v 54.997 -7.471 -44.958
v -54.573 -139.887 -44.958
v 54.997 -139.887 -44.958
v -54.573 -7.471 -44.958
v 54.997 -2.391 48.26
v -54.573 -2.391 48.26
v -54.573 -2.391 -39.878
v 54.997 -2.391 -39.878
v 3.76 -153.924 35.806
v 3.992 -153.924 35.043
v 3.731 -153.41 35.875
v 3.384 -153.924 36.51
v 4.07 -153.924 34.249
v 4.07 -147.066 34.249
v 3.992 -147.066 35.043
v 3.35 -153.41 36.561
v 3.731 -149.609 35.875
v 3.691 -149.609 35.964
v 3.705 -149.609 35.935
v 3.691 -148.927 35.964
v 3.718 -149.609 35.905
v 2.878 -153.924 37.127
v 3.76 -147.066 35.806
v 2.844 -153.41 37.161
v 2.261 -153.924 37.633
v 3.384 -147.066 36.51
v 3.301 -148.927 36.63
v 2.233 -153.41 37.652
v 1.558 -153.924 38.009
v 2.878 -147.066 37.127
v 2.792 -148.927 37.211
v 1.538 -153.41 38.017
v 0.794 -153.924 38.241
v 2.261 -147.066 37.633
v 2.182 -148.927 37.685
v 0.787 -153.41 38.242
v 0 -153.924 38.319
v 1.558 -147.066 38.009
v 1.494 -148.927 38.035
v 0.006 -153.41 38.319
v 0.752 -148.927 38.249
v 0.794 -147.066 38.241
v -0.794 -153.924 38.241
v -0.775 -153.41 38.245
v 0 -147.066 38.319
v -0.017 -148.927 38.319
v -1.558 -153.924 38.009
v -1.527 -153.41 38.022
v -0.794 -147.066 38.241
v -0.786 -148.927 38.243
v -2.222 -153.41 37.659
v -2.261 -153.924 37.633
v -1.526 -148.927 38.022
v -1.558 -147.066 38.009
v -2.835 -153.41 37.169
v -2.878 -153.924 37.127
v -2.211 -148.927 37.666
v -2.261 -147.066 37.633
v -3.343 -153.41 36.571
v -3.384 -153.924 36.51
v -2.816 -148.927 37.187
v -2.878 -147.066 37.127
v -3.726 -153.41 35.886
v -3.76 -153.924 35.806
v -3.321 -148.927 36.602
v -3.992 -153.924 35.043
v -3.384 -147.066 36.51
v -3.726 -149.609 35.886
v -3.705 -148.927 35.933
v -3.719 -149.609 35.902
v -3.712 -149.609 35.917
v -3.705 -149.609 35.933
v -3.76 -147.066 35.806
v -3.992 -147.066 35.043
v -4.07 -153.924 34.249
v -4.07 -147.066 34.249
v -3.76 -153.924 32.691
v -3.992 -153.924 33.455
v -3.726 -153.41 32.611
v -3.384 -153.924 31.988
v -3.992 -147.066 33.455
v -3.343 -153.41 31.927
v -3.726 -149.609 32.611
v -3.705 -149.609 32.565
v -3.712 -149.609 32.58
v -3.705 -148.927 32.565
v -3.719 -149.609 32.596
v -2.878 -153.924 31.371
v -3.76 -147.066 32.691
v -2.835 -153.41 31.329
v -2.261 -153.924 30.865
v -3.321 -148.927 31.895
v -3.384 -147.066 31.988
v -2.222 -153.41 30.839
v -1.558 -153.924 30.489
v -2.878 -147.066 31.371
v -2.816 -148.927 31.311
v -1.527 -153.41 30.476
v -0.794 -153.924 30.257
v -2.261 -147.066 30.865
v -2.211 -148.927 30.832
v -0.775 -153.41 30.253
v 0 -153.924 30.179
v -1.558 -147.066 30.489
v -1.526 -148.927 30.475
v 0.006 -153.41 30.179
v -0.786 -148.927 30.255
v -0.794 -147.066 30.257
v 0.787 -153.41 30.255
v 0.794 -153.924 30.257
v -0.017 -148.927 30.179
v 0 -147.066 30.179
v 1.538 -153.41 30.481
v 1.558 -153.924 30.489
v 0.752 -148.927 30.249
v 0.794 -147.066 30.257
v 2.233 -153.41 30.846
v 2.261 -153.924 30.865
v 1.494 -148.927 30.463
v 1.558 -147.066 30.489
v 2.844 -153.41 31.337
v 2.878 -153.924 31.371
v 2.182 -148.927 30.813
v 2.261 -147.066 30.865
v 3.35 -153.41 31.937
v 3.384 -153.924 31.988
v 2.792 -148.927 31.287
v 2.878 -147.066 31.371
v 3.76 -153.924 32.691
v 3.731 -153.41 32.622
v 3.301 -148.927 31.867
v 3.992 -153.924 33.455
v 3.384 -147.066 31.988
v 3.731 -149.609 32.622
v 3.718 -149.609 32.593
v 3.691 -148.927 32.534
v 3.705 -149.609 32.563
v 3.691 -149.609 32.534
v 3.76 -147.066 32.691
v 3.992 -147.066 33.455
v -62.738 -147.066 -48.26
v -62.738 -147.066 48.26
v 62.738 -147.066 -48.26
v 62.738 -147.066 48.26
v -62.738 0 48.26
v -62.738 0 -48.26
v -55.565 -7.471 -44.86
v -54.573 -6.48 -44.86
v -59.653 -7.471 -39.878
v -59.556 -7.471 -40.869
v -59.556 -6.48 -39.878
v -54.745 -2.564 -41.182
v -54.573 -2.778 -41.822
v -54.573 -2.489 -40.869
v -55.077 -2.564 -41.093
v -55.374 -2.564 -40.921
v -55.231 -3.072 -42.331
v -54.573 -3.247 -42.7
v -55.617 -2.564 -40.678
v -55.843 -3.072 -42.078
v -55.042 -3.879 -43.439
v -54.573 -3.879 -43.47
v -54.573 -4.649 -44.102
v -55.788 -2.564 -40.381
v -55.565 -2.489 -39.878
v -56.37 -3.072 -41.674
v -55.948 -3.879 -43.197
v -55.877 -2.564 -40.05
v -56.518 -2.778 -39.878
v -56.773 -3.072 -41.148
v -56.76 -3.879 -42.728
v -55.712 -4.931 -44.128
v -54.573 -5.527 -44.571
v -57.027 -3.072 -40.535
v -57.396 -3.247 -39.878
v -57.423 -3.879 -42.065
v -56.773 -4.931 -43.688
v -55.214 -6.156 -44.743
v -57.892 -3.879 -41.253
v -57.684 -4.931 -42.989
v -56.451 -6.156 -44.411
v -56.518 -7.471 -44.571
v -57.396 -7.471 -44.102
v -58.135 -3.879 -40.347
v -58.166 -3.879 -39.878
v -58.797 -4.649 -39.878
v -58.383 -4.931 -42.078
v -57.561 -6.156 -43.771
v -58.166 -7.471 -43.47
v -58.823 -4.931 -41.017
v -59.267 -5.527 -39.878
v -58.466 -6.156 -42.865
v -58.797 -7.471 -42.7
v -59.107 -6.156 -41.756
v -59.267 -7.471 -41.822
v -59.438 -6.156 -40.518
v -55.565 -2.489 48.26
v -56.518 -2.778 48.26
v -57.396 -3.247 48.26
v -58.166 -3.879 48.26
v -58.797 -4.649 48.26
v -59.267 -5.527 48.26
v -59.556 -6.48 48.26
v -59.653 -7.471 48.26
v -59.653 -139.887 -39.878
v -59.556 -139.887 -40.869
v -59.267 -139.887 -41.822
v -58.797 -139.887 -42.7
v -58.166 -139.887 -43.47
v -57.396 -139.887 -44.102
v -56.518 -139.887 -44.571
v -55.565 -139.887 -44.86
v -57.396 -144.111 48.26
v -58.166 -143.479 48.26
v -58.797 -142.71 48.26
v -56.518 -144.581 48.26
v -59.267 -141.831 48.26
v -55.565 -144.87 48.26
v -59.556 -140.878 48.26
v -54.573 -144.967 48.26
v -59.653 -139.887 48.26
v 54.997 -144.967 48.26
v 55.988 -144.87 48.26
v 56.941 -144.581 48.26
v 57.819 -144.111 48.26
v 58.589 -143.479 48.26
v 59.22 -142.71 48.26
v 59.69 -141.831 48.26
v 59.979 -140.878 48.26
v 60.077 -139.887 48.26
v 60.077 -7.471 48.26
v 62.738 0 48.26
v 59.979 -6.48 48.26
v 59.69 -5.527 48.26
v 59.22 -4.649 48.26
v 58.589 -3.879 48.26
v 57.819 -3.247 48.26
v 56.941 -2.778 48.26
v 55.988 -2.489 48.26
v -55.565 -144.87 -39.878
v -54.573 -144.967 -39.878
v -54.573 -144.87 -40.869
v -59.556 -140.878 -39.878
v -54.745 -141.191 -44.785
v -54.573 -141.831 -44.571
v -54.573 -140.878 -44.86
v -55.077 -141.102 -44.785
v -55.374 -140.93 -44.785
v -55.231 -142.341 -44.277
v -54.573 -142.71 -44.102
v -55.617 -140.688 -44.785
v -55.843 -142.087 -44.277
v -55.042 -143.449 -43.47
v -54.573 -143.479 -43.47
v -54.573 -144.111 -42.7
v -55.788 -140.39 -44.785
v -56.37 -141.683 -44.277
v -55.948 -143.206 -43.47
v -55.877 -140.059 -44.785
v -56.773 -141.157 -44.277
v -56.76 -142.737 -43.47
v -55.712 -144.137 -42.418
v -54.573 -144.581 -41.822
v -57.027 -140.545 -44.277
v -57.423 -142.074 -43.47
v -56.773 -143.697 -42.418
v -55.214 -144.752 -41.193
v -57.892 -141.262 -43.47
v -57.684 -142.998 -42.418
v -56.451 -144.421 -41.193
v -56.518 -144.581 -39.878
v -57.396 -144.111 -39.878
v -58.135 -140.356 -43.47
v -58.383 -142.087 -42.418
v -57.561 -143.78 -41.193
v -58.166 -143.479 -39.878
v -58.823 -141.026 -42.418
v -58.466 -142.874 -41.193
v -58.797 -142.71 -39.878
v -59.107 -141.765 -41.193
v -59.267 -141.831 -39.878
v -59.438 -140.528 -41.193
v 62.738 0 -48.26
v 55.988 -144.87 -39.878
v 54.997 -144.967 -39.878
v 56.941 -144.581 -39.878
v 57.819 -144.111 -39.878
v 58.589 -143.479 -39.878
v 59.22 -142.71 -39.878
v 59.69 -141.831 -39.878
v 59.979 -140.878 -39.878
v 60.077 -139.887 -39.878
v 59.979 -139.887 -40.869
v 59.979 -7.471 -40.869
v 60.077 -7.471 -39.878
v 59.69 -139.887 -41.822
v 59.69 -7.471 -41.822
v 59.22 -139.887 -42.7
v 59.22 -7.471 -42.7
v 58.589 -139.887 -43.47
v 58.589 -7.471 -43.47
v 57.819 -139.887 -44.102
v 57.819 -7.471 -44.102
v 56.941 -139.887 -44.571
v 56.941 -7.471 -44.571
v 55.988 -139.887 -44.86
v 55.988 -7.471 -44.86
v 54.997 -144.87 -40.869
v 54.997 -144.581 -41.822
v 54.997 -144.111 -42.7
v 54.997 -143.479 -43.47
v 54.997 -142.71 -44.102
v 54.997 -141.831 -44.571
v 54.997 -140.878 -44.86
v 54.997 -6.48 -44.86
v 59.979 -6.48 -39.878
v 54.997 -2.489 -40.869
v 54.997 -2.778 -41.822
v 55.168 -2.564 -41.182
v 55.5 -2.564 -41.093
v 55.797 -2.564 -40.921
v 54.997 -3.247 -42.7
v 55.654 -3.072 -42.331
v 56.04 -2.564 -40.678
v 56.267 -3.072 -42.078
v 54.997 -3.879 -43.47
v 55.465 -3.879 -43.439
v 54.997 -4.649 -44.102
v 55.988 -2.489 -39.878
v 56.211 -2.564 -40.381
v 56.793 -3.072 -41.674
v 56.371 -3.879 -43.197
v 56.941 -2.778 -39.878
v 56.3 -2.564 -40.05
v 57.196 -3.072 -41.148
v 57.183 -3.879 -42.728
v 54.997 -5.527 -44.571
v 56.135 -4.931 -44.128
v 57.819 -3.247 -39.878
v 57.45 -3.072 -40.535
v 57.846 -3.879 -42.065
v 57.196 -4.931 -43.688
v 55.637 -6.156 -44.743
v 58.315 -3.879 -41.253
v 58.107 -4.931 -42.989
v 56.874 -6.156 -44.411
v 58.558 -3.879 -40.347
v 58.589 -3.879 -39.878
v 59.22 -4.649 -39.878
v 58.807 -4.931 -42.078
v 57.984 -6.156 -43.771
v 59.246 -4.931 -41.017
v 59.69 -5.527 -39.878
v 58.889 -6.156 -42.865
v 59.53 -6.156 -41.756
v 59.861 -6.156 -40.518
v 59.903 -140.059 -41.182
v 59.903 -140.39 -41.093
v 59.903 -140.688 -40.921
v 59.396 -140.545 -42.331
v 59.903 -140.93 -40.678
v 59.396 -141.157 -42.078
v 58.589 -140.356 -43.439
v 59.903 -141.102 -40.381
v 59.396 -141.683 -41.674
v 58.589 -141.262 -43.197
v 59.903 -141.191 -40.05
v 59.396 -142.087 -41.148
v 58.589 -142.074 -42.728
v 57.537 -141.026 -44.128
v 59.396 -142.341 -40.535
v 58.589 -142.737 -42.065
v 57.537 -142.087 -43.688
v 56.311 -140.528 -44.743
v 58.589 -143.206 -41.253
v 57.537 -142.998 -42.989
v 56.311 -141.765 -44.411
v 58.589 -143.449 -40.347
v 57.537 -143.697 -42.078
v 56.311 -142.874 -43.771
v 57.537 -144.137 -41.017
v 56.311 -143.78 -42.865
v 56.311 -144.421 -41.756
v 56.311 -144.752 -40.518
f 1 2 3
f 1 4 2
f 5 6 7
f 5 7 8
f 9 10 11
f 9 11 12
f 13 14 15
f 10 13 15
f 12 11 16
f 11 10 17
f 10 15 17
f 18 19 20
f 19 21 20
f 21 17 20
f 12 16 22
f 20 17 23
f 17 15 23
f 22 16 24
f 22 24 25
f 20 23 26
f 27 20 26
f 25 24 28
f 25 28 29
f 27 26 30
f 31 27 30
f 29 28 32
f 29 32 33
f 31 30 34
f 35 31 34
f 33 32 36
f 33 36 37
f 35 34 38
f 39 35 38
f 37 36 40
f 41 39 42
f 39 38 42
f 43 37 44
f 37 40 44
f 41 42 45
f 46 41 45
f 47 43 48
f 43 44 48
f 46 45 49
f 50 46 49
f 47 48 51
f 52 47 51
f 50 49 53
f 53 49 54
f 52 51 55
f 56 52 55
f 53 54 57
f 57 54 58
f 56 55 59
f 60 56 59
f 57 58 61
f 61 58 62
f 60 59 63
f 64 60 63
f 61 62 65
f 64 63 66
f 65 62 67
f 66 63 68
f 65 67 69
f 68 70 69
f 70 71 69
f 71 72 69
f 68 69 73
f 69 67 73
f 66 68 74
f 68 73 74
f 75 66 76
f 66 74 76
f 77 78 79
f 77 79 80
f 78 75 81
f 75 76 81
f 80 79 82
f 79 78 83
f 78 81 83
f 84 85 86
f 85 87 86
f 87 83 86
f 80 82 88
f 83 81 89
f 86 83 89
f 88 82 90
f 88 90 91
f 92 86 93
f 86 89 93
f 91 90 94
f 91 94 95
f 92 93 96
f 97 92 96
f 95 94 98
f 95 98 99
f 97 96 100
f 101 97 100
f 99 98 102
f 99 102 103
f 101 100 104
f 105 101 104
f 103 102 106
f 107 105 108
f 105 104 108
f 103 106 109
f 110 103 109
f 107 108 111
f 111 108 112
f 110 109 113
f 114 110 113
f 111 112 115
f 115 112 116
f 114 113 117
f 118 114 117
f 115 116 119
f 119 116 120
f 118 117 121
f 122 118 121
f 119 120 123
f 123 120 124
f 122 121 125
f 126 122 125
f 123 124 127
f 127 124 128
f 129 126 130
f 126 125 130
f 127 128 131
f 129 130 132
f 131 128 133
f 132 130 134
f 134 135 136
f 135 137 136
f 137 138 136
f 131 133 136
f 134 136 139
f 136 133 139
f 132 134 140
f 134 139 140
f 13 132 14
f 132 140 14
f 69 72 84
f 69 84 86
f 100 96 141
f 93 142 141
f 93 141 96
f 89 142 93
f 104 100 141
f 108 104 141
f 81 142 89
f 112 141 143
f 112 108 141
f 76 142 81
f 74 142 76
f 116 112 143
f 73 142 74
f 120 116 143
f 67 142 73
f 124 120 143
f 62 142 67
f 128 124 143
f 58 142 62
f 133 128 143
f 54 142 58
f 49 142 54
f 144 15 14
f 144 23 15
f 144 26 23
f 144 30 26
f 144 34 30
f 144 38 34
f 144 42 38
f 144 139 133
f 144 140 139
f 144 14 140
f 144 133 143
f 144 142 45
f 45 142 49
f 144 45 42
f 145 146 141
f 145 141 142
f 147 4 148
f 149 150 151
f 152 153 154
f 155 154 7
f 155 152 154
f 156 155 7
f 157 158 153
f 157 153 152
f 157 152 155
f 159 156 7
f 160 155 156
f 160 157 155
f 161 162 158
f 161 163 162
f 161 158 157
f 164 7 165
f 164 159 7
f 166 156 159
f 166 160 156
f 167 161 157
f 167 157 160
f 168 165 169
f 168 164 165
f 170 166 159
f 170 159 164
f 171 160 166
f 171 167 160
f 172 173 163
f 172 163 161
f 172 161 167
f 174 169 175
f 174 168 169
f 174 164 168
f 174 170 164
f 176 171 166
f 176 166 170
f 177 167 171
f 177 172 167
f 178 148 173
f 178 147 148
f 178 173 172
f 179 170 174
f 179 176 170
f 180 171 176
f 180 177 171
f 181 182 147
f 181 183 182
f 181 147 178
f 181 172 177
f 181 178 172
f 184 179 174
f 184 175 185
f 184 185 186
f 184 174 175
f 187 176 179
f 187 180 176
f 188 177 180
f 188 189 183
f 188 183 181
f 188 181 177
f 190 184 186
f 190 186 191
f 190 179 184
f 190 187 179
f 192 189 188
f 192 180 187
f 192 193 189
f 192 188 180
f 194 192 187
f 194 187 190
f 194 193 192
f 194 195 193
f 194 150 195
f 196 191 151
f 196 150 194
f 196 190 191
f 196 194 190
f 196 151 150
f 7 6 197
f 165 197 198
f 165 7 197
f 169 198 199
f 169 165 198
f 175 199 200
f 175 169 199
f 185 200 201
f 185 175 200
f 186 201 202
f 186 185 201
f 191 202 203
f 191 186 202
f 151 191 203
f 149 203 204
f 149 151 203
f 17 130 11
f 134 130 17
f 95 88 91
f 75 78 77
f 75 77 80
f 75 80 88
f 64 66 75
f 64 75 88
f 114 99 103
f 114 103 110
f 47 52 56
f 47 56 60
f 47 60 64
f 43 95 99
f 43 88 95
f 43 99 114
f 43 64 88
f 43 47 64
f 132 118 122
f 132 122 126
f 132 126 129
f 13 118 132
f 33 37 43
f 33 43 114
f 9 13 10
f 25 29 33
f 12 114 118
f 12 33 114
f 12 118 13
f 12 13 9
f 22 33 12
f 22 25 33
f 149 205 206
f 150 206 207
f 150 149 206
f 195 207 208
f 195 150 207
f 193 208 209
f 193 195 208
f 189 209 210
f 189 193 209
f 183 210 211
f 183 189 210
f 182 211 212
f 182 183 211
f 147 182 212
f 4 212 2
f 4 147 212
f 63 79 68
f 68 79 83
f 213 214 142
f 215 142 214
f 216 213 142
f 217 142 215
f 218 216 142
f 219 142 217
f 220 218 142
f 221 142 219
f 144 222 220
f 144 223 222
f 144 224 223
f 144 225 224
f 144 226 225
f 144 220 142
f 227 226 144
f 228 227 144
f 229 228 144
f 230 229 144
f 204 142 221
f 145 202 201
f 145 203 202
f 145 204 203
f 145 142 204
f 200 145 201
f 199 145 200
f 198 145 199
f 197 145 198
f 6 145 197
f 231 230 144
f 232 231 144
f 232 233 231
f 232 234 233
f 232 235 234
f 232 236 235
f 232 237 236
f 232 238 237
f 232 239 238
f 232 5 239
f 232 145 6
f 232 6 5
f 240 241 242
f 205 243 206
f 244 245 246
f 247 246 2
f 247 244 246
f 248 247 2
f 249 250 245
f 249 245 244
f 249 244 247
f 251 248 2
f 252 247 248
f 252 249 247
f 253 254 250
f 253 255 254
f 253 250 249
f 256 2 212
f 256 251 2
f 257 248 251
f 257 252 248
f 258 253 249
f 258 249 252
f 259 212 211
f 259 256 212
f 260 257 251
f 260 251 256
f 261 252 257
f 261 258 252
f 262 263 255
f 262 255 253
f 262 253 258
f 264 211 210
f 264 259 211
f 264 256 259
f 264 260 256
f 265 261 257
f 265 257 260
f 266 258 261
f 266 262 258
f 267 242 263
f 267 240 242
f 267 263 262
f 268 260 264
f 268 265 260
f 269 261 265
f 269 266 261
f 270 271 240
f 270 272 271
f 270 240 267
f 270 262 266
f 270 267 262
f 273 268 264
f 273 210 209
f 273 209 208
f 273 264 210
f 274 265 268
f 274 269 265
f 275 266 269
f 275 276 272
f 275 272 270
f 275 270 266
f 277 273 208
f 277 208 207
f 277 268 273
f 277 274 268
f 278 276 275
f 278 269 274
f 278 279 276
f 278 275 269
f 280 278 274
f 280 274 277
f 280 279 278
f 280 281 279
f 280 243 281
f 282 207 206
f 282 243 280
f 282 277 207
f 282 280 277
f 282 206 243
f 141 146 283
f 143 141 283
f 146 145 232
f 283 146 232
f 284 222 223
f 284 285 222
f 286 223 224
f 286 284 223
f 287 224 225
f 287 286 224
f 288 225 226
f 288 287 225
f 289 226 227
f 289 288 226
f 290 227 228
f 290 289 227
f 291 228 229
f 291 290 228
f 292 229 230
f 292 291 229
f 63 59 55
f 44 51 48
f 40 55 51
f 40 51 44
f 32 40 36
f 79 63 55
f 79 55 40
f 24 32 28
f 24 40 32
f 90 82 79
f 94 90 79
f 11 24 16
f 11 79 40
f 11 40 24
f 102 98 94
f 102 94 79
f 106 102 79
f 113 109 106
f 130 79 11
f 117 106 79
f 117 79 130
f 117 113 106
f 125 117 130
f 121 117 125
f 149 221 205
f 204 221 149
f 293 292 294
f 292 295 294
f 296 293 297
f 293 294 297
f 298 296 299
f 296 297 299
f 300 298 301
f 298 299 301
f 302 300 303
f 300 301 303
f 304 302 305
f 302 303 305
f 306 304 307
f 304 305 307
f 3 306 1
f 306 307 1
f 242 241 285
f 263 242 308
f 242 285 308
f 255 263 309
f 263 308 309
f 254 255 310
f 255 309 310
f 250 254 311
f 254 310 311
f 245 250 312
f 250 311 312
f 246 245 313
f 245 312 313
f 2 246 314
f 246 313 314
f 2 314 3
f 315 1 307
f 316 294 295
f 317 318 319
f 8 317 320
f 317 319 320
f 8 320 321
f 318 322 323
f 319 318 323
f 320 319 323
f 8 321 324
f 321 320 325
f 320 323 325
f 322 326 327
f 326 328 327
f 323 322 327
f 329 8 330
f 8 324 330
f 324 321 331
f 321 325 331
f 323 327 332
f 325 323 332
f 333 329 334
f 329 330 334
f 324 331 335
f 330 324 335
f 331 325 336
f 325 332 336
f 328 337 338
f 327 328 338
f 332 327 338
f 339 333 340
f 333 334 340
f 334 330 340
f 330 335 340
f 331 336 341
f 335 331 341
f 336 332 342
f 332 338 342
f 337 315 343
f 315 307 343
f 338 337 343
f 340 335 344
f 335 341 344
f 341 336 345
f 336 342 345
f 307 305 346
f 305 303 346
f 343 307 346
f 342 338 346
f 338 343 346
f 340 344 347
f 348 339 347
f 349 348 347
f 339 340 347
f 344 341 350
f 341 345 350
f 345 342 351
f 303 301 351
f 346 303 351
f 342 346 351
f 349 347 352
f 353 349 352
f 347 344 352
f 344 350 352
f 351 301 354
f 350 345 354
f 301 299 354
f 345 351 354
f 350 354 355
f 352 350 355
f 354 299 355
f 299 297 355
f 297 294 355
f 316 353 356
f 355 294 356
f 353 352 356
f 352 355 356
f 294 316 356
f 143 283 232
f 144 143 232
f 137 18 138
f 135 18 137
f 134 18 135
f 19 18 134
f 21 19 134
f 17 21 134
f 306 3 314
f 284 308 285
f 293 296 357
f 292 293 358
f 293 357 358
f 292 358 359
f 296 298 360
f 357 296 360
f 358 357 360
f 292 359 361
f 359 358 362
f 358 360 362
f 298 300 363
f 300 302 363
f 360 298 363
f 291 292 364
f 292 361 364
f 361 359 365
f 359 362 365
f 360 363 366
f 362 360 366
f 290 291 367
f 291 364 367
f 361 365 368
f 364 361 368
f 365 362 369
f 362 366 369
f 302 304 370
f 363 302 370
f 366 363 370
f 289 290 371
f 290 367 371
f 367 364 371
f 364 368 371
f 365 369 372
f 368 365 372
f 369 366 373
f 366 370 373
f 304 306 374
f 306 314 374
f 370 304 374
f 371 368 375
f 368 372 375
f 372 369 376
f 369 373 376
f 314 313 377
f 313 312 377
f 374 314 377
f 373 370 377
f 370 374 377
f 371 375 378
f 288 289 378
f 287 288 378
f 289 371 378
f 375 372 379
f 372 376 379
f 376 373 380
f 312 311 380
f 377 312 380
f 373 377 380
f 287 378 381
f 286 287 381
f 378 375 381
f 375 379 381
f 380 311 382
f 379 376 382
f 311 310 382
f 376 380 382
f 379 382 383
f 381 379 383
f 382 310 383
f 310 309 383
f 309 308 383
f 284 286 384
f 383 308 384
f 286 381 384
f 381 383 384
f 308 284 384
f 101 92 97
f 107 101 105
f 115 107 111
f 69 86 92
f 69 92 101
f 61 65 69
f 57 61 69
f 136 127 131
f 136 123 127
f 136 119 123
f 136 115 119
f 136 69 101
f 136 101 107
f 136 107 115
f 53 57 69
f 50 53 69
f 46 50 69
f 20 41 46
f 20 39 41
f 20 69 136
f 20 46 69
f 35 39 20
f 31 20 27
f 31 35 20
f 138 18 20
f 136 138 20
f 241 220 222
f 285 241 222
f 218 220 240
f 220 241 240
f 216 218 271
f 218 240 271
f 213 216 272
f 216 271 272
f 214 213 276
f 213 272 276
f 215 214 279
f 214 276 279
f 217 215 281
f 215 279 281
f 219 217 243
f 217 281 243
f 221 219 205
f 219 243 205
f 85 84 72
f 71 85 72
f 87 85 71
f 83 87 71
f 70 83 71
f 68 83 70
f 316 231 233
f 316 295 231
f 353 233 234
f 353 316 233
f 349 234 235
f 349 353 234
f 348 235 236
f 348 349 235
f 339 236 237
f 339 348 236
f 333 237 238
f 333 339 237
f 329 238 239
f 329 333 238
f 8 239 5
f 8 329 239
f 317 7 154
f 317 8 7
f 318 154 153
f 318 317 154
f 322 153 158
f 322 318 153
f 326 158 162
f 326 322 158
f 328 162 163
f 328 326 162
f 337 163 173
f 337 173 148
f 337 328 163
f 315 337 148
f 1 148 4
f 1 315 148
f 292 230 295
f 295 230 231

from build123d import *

# Parameters (mm, degrees)
F0_W     = 125.476
F0_H     = 96.52
F1_DEPTH = 147.066
F2_W     = 119.730074
F2_H     = 142.576096
F3_DEPTH = 93.218
F4_R     = 4.07019
F5_DEPTH = 6.858
F6_W     = 7.457384
F6_H     = 3.801271
F7_DEPTH = 93.219
F8_W     = 7.396578
F8_H     = 3.085688
F9_DEPTH = 96.521
F10_R    = 5.08


with BuildPart() as f1:
    # F0 (on Front) → F1 (new body)
    with BuildSketch(Plane.XZ):
        Rectangle(F0_W, F0_H)
    extrude(amount=F1_DEPTH)

    # F2 (on face) → F3 (cut)
    with BuildSketch(Plane.XY.offset(48.26)):
        with Locations((0.211539, -73.679165)):
            Rectangle(F2_W, F2_H)
    extrude(amount=-F3_DEPTH, mode=Mode.SUBTRACT)

    # F4 (on face) → F5 (join)
    with BuildSketch(Plane.XZ.offset(147.066)):
        with Locations((0, 34.248885)):
            Circle(F4_R)
    extrude(amount=F5_DEPTH)

    # F6 (on face) → F7 (cut, through all)
    with BuildSketch(Plane.XY.offset(-44.958)):
        with Locations((0.002428, -151.50956)):
            Rectangle(F6_W, F6_H)
    extrude(amount=F7_DEPTH, mode=Mode.SUBTRACT)

    # F8 (on face) → F9 (cut, through all)
    with BuildSketch(Plane.XY.offset(48.26)):
        with Locations((-0.007179, -150.470339)):
            Rectangle(F8_W, F8_H)
    extrude(amount=-F9_DEPTH, mode=Mode.SUBTRACT)

    # F10
    f10_edges = [f1.edges().sort_by_distance(p)[0] for p in [
        (-59.653498, -144.967213, 1.651),
        (0.211539, -144.967213, -44.958),
        (-59.653498, -73.679165, -44.958),
        (60.076576, -73.679165, -44.958),
        (60.076576, -144.967213, 1.651),
        (0.211539, -2.391117, -44.958),
        (-59.653498, -2.391117, 1.651),
        (60.076576, -2.391117, 1.651),
    ]]
    fillet(f10_edges, radius=F10_R)


solid = f1.part
